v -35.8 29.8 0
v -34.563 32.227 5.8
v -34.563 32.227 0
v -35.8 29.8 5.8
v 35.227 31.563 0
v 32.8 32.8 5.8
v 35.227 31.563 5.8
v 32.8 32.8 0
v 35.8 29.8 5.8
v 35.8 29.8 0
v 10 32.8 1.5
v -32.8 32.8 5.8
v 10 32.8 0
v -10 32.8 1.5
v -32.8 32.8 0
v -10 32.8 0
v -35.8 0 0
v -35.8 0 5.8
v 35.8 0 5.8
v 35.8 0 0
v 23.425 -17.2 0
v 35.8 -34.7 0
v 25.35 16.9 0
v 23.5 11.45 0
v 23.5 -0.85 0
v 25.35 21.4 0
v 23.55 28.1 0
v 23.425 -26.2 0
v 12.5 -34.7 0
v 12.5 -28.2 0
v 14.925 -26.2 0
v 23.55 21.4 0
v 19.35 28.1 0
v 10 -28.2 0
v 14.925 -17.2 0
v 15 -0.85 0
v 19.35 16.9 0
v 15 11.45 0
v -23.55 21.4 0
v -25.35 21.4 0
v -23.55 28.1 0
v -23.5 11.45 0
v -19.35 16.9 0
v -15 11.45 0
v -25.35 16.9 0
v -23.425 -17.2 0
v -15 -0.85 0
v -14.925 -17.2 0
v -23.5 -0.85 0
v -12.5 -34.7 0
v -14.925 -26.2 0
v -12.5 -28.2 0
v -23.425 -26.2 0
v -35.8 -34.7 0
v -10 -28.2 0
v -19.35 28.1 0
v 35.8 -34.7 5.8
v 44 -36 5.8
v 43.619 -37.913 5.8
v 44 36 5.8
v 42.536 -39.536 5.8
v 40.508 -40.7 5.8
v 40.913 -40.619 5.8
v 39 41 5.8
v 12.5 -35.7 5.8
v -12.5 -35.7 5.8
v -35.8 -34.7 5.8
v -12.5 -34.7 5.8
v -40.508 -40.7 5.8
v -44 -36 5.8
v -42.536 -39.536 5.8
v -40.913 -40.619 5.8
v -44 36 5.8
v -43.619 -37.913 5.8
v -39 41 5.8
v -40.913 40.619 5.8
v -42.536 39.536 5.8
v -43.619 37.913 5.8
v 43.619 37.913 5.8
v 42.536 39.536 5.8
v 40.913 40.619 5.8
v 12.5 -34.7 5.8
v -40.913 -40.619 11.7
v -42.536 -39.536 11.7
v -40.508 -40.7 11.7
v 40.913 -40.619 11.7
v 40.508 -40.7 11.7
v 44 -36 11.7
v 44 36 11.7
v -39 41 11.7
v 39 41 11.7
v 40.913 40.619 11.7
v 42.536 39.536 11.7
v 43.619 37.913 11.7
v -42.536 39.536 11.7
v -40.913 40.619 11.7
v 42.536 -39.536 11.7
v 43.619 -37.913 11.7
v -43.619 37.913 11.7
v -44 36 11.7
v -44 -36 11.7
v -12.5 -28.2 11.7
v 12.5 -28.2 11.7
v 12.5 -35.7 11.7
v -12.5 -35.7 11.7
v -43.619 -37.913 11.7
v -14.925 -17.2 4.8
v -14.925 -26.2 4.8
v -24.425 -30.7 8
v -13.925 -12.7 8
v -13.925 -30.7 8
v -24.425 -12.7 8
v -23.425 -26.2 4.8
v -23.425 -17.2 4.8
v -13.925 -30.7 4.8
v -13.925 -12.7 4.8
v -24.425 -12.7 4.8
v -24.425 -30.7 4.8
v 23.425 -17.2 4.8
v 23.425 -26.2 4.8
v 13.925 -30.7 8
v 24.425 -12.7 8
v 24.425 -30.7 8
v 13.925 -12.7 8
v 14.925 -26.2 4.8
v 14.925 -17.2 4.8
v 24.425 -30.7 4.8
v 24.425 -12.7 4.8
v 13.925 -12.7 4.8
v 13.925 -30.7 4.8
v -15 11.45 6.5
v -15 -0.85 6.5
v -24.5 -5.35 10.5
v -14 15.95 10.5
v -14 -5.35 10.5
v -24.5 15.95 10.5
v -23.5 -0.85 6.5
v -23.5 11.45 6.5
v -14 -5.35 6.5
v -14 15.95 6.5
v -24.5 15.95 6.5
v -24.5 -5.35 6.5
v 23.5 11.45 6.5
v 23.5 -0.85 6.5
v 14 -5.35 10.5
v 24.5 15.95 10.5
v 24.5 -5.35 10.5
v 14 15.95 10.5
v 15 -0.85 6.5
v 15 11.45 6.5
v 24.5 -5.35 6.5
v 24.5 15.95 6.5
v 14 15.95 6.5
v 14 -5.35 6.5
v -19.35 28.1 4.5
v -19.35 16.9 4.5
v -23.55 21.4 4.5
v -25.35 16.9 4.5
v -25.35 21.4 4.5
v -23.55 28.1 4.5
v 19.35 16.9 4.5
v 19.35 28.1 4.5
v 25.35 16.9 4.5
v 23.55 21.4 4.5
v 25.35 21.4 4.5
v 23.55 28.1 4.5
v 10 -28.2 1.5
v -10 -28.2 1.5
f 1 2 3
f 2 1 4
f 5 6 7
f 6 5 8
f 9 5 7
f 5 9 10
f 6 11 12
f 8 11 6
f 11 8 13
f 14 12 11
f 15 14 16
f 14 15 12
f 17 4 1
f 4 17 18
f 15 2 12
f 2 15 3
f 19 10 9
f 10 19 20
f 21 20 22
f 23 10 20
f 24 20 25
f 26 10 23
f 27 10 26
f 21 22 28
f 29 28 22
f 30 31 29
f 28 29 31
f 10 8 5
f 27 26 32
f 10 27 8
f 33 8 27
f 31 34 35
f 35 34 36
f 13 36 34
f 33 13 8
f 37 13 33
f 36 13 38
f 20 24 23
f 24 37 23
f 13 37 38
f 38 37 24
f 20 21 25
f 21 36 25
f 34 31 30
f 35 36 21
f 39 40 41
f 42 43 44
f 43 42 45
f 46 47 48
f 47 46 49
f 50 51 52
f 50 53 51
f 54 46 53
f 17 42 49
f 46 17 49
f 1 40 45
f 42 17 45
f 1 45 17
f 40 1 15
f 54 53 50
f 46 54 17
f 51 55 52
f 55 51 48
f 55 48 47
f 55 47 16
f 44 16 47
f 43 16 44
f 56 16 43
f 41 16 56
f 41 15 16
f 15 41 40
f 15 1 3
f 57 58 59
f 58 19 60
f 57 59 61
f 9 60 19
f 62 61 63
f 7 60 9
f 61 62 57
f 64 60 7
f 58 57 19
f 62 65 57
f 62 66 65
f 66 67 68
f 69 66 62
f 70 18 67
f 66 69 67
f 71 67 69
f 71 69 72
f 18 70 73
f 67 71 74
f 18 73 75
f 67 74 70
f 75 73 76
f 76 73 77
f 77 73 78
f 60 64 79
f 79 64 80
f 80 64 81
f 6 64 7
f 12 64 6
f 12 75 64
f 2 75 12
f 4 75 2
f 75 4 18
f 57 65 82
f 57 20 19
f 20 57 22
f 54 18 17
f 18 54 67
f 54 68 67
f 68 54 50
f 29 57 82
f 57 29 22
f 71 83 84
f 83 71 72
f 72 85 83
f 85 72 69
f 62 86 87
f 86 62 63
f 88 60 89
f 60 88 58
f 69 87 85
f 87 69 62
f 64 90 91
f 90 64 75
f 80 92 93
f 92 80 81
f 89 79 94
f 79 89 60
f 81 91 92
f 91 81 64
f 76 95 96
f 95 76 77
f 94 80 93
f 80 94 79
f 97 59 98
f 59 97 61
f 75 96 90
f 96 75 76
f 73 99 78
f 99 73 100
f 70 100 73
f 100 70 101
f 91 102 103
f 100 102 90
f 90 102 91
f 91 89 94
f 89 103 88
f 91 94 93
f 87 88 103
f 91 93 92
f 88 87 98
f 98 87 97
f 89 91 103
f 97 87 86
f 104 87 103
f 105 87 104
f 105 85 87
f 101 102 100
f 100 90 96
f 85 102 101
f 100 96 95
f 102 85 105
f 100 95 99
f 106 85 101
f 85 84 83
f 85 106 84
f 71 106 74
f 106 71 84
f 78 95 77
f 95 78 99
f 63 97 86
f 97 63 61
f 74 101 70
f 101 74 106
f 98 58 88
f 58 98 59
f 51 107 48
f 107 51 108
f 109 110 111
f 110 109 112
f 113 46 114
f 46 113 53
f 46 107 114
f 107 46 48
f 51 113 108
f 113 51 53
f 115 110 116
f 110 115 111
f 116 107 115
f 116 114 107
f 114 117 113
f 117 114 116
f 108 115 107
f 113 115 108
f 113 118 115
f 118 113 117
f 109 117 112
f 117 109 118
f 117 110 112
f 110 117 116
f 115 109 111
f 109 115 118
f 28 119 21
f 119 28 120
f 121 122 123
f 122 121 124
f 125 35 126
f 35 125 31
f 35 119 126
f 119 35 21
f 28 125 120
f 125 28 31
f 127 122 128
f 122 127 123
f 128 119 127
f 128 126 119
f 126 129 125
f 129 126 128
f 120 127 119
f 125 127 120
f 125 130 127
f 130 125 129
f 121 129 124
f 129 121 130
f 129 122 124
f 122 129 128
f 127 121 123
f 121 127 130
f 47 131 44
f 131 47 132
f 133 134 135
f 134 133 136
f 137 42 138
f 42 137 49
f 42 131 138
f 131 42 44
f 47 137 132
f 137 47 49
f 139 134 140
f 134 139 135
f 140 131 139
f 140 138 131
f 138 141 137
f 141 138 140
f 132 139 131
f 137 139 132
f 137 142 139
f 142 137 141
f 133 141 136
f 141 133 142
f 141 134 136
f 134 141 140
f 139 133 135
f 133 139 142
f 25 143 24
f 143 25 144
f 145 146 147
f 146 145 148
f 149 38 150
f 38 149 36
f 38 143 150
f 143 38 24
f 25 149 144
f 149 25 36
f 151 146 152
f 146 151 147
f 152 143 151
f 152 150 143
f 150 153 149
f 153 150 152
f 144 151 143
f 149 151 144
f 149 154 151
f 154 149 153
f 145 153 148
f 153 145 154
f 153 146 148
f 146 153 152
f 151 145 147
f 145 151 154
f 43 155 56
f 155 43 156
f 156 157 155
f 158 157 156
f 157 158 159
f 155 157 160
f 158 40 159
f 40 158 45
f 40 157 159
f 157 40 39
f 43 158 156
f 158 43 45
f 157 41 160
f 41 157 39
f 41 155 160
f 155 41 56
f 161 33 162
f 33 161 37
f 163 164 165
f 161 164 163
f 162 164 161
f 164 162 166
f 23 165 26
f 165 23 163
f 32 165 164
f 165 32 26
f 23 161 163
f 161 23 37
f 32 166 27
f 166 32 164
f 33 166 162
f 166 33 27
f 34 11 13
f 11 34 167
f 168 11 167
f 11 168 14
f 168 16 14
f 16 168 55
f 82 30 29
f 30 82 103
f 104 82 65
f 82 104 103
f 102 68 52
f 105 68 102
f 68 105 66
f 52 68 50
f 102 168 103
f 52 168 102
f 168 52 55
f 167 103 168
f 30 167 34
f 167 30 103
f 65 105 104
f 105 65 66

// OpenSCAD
// 2026-11-04: U1 feeder insert v11, RELEASED (firm hold, stop tab perfect; a bit stiff to remove, friction). Drops into the 72 x 66 opening in the dry
// box's top panel (flange on the top face, RTV seal); the feeder hangs under it on its own
// hooks, mounting face up, outlets toward the back wall. Copies the printer's side-panel
// windows (measured on the printer), with the panel thickness the hooks expect under each
// lip: black hooks (outlet end) gap 5.0 -> 4.8 seat; white hooks (inlet end) gap 6.7 -> 6.5.
// v1 -> v2: windows from the printer panel instead of photo estimates (pairs 38.35 and
// 38.5 apart, black-white 27.0 apart, black 9 x 8.5, white 11.8 x 8, along x across);
// latch notch copied from the printer (stepped, one side only); cable slot moved to the
// inlet end like the printer: the cable lies in the feeder's center channel to its socket.
// v2 -> v3: cable slot at the front (inlet) end, latch notch at the back (outlet) end beyond
// the black windows; 20 mm ribbon groove in the underside, the full body length, leading to
// the cable slot; slot shortened to 6 along y so the layout fits the 66 mm opening.
// v3 -> v4: sealed: only the cable slot goes through. Hook windows are blind cavities from
// below (window up past the lip, then the lip's landing undercut at the seat height), capped
// by a flat top (flange 5.9 thick); latch notch on both sides, blind, 4.5 deep from below.
// v4 -> v5: white windows moved beside the latch notch (back), black windows beside the cable
// slot (front), as on the printer (the notch sits next to the wide 11.8 window); the lip
// undercut now runs lip_land both ways along y, so the hooks catch whichever way they slide.
// v5 -> v6: latch notch flipped, its wide (6) end opens toward the cable slot (front).
// v6 -> v7 (after the v6 test fit, which worked but was tight): white windows 0.5 bigger
// each way, centers kept; all hook windows and notches shift 2.6 toward the cable-slot end
// so the feeder's outlet face lands flush with the insert edge (the back wall side).
// v7 -> v8: the cable slot shifts the same 2.6, so it now opens through the body's back
// edge (the top panel's opening edge closes it below the flange).
// v10 -> v11: the two stop-tab notches 0.5 further apart (0.25 outward each), easier release.
// v9 -> v10 (v9 test fit): stop-tab notches moved 1.5 toward the middle and 0.5 away from the
// cable outlet, so the latch tab is preloaded while sliding and relaxes when fully engaged.
// v8 -> v9: the top panel's opening now runs out through its back edge over one solid
// back-panel tab, so the insert body extends back to the back panel's inner face (less
// clearance) and the flange back to its outer face; the cable slot opens through the
// lengthened body's back edge against the back panel.
// Lip thicknesses are photo estimates (black ~1.9, white ~3.1); cavities leave room.
// Notch offset is scaled from a photo (about +-1 mm): check on the test.
// Install: plug the cable into the feeder, lay it in the center channel, feed the far plug up
// through the cable slot, hooks in, slide the feeder toward its outlets until it latches.
// Print flange down (the feeder face prints as the smooth top), PLA, 0.2 mm, 4 walls,
// 15 % infill for the test, no supports. Units mm.
// Axes: x across the feeder, y along it (+y = outlet end = back wall), z up; z = 0 is the
// feeder face, flush with the acrylic's underside. Seen from below (from the feeder) this
// matches the printer panel seen from outside, with the printer's front at +y.

t        = 5.8;          // acrylic, top panel
open     = [72, 66];     // opening in the top panel (x, y), corners r 3
open_r   = 3;
clr      = 0.2;          // body to opening, each side
flange_w = 8;

body_y   = open[1] / 2 - clr;   // body half-length, 32.8
end_wall = 1.2;
cable_slot = [25, 6];    // across x, along y; passes the 20 x 5 plug
cable_gap  = 2.0;        // slot to the black windows' front edge
shift    = -2.6;         // v7: windows and notches toward the cable-slot end
y_black0 = -body_y + end_wall + cable_slot[1] + cable_gap + 9.0 / 2;   // v6 position
y_black  = y_black0 + shift;
y_white  = y_black + 27.0;
white_grow = 0.5;        // v7: white windows were tight

// windows: [x center, y center, size along y, size across x, lip seat, cavity top]
WIN = [
    [-38.35 / 2, y_black,  9.0, 8.5, 4.8,  8.0],
    [ 38.35 / 2, y_black,  9.0, 8.5, 4.8,  8.0],
    [-38.5 / 2,  y_white, 11.8 + white_grow, 8.0 + white_grow, 6.5, 10.5],
    [ 38.5 / 2,  y_white, 11.8 + white_grow, 8.0 + white_grow, 6.5, 10.5],
];
lip_land = 4.5;          // undercut extends this far past each window, both ways along y
cap      = 1.2;          // boss wall over and around each cavity

// latch notch on both sides (blind, notch_d deep from below), beyond the white window toward the back: inner edge straight,
// outer edge stepped, 6 wide at the front (open toward the cable slot) for notch_step,
// then 4.2 wide; 11.2 long
notch_gap  = 5.2 + 0.5;  // white window back edge to notch (v10: +0.5 away from the cable outlet)
notch_len  = 11.2;
notch_step = 4.5;
notch_w    = [4.2, 6.0];
notch_in   = 38.5 / 2 + 1.35 - 1.5 + 0.25;   // inner edge from the centerline (v10: 1.5 in; v11: 0.25 back out)
notch_d    = 4.5;               // latch block sticks up ~3.5

groove_w = 20;           // ribbon groove in the underside (15-pin 1.25 mm ribbon ~19 wide)
groove_d = 1.5;

// flat top over the tallest cavity, so the insert still prints flange down on a flat face
T = max([for (w = WIN) w[5]]) + cap;
// back (-y, cable-slot) end: the outlet face is flush with the v8 body edge (-body_y), 2.1
// (foam) in front of the back panel's inner face; the panel is 5.8 thick
foam    = 2.1;
body_bk = -body_y - foam + clr;     // body back edge, clr short of the back panel
fl_bk   = body_bk - clr - t;     // flange back edge, flush with the back panel's outside

module rrect(size, r) { offset(r = r) square(size - [2, 2] * r, center = true); }
module box(x0, x1, y0, y1, z0, z1) { translate([x0, y0, z0]) cube([x1 - x0, y1 - y0, z1 - z0]); }

y_black_fr = y_black - 9.0 / 2;    // black windows' front edge (sets the cable slot)
y_white_bk = y_white + 11.8 / 2;   // white windows' nominal back edge (sets the notch)

difference() {
    union() {
        linear_extrude(t) rrect(open - [2, 2] * clr, open_r);
        box(-(open[0] / 2 - clr), open[0] / 2 - clr, body_bk, 0, 0, t);   // body to the back wall
        translate([0, 0, t]) linear_extrude(T - t) intersection() {
            rrect(open + [2, 2] * flange_w, open_r + 2);
            translate([-100, fl_bk]) square([200, 200]);
        }
    }
    for (w = WIN) {
        x0 = w[0] - w[3] / 2; x1 = w[0] + w[3] / 2;
        y0 = w[1] - w[2] / 2; y1 = w[1] + w[2] / 2;
        box(x0, x1, y0, y1, -1, w[5]);
        // cavity above the lip seat, over the window and the lip's landing
        box(x0 - 1, x1 + 1, y0 - lip_land, y1 + lip_land, w[4], w[5]);
    }
    // latch notches, both sides, blind: wide end toward the front (cable slot)
    ny0 = y_white_bk + notch_gap;
    for (m = [0, 1]) mirror([m, 0, 0]) {
        box(-notch_in - notch_w[1], -notch_in, ny0, ny0 + notch_step, -1, notch_d);
        box(-notch_in - notch_w[0], -notch_in, ny0 + notch_step - 0.01, ny0 + notch_len, -1, notch_d);
    }
    // ribbon groove, full body length (stops inside the opening's footprint)
    box(-groove_w / 2, groove_w / 2, body_bk - 1, body_y + 1, -1, groove_d);
    // cable slot
    box(-cable_slot[0] / 2, cable_slot[0] / 2,
        body_bk - 1, y_black_fr - cable_gap, -1, T + 1);   // open through the back edge
}

echo(str("v11: back edge ", body_bk, ", flange back ", fl_bk, "; body ", open - [2, 2] * clr, ", flange ", open + [2, 2] * flange_w, " x ", T - t,
         "; cable slot y ", body_bk, " to ", y_black_fr - cable_gap,
         "; black y ", y_black, ", white y ", y_white, "; notch y ", y_white_bk + notch_gap,
         " to ", y_white_bk + notch_gap + notch_len, " (body edge +-", body_y, ")"));
